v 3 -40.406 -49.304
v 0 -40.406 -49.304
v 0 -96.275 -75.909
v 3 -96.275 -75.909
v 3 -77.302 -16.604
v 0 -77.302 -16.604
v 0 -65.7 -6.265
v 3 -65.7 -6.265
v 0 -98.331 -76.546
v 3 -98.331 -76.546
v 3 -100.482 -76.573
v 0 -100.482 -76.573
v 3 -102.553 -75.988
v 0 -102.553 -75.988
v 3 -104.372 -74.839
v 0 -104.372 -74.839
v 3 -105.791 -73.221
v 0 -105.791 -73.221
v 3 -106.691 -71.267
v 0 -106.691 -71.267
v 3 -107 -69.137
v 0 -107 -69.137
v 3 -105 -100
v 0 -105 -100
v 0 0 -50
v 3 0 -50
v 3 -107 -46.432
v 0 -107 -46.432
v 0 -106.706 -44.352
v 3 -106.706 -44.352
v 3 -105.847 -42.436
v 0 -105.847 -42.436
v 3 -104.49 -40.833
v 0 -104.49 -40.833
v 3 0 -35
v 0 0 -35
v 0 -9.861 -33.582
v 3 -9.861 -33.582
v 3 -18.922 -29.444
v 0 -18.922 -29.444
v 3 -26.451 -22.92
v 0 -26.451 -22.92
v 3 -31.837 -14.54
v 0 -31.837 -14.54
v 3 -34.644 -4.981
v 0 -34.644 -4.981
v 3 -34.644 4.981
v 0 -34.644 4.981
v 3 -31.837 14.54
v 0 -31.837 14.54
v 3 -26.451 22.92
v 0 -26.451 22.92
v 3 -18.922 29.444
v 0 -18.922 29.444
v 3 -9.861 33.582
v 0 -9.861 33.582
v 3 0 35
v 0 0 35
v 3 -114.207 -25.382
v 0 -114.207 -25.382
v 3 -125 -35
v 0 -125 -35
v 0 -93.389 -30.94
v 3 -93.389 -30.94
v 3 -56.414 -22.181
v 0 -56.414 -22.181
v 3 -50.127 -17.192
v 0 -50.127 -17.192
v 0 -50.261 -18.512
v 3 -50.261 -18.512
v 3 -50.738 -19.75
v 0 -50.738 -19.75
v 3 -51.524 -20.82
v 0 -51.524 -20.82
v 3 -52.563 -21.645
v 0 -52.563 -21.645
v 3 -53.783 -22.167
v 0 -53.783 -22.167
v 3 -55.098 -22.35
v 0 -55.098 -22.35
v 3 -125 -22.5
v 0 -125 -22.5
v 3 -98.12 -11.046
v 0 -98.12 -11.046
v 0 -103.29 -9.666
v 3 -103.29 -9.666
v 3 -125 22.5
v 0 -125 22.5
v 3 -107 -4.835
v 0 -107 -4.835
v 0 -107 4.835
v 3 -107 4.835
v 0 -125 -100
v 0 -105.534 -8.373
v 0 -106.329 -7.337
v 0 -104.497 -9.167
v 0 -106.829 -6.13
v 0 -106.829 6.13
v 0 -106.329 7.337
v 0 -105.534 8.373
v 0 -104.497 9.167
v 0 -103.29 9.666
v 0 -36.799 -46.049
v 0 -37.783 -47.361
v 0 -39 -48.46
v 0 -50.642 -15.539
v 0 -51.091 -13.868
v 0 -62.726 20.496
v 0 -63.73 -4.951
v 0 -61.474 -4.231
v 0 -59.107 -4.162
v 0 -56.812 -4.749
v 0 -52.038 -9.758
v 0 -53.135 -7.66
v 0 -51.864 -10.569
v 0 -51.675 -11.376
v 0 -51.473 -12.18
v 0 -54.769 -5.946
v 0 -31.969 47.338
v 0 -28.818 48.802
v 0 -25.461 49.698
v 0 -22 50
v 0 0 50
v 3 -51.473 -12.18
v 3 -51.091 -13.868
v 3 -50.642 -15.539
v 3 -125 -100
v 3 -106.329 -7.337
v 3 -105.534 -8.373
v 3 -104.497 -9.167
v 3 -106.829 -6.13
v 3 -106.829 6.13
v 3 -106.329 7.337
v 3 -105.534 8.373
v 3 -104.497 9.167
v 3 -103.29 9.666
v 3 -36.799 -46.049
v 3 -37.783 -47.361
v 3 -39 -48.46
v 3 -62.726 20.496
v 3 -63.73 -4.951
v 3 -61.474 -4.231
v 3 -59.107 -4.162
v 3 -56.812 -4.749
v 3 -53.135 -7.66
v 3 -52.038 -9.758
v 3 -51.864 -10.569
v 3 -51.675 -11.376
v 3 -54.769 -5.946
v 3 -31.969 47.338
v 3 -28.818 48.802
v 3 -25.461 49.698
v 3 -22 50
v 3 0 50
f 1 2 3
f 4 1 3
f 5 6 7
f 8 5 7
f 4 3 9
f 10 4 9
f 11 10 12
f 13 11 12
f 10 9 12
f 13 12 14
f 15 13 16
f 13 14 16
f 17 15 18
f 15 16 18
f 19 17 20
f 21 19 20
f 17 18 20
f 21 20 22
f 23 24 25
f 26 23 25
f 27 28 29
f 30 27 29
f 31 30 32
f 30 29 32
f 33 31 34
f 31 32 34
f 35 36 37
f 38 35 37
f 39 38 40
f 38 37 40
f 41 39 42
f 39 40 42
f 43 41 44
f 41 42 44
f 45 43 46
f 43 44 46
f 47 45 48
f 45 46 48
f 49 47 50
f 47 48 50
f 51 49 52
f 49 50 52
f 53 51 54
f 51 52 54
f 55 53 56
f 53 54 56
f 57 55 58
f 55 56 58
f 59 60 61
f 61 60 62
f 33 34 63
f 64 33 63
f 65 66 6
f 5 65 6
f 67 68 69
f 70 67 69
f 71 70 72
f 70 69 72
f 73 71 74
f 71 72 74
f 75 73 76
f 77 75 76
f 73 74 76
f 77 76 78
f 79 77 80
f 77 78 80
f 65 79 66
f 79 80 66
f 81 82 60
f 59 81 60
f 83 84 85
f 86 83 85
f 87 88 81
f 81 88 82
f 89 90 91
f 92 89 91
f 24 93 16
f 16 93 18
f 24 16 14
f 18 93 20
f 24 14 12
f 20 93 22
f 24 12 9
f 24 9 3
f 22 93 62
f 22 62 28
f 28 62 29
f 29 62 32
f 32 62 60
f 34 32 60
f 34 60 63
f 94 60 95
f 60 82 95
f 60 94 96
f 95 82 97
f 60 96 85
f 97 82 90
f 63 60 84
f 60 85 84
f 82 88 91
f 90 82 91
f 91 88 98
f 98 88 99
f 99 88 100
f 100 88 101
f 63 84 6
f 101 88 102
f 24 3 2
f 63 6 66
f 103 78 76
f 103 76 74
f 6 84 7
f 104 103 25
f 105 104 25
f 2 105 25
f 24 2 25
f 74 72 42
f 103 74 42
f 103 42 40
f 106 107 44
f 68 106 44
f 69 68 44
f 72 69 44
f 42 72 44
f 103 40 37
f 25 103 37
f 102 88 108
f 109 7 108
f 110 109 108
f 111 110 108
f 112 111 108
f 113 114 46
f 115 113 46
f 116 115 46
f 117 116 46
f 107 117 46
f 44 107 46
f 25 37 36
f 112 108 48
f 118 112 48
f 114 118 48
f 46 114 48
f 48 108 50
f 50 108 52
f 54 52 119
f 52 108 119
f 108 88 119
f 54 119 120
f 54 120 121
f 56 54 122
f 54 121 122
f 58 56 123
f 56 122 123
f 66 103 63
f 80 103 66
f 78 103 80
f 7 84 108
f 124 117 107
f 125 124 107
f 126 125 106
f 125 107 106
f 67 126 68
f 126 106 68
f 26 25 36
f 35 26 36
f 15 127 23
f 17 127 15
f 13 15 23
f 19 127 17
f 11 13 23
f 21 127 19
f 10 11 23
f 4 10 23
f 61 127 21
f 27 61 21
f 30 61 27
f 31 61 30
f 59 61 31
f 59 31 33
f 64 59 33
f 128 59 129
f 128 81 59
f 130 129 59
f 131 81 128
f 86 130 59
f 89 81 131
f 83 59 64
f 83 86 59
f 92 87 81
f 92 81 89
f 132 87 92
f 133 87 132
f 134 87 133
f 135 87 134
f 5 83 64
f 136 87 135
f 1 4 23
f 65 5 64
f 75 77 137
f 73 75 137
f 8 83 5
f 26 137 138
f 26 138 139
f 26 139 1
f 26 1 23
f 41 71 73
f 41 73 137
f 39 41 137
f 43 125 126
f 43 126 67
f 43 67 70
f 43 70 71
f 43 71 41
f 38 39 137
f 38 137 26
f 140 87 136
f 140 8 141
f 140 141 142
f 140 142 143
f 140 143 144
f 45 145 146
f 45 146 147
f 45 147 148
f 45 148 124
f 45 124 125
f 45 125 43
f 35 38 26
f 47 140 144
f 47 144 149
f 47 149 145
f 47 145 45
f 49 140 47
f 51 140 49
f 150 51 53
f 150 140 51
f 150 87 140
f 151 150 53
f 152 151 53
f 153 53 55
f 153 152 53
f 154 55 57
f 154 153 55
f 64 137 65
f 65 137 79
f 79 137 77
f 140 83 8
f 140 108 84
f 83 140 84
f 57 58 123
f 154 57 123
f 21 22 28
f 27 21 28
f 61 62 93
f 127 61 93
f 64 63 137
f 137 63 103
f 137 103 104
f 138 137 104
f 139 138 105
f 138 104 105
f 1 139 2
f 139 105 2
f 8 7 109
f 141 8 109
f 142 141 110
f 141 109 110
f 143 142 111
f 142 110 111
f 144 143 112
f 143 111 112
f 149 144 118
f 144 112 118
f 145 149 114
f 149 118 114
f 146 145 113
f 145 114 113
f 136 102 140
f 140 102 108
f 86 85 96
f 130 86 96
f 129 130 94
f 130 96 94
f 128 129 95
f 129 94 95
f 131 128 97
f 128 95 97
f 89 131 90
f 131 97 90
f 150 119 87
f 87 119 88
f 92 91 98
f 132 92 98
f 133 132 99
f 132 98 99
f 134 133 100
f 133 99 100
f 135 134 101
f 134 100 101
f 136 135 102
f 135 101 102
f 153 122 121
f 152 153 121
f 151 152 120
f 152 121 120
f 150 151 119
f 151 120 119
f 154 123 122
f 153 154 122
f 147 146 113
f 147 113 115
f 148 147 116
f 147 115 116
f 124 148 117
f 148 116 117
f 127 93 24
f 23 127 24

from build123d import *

# Parameters (mm, degrees)
F1_DEPTH = 3
F3_DEPTH = 3


with BuildPart() as f1:
    # F0 (on Right) → F1 (new body)
    with BuildSketch(Plane.YZ):
        with BuildLine():
            ThreePointArc((0, -35), (-35, 0), (0, 35))
            Line((0, 35), (0, 50))
            Line((0, 50), (-22, 50))
            ThreePointArc((-22, 50), (-29.119444, 48.689931), (-35.306192, 44.931351))
            Line((-35.306192, 44.931351), (-125, -35))
            Line((-125, -35), (-125, -100))
            Line((-125, -100), (-105, -100))
            Line((-105, -100), (0, -50))
            Line((0, -50), (0, -35))
        make_face()
        with BuildLine():
            ThreePointArc((-96.275498, -75.908841), (-103.504138, -75.479065), (-107, -69.137387))
            Line((-107, -69.137387), (-107, -46.431792))
            ThreePointArc((-107, -46.431792), (-106.343744, -43.363703), (-104.489822, -40.832535))
            Line((-104.489822, -40.832535), (-65.699873, -6.264563))
            ThreePointArc((-65.699873, -6.264563), (-57.267065, -4.57705), (-51.677673, -11.113001))
            ThreePointArc((-51.677673, -11.113001), (-46.996343, -24.335108), (-38.322833, -35.358229))
            ThreePointArc((-38.322833, -35.358229), (-36.281412, -38.203278), (-35.560135, -41.629861))
            ThreePointArc((-35.560135, -41.629861), (-36.8729, -46.167883), (-40.405699, -49.304175))
            Line((-40.405699, -49.304175), (-96.275498, -75.908841))
        make_face(mode=Mode.SUBTRACT)
    extrude(amount=F1_DEPTH)

    # F2 (on Right) → F3 (join)
    with BuildSketch(Plane.YZ):
        with BuildLine():
            ThreePointArc((0, -35), (-35, 0), (0, 35))
            Line((0, 35), (0, 50))
            Line((0, 50), (-18.720067, 50))
            ThreePointArc((-18.720067, 50), (-21.972131, 49.787579), (-25.168931, 49.153926))
            Line((-25.168931, 49.153926), (-125, 22.5))
            Line((-125, 22.5), (-125, -22.5))
            Line((-125, -22.5), (-25.168931, -49.153926))
            ThreePointArc((-25.168931, -49.153926), (-21.972131, -49.787579), (-18.720067, -50))
            Line((-18.720067, -50), (0, -50))
            Line((0, -50), (0, -35))
        make_face()
        with BuildLine():
            Line((-103.289773, 9.665908), (-56.184511, 22.242556))
            ThreePointArc((-56.184511, 22.242556), (-51.209908, 20.791419), (-50.193177, 15.710206))
            ThreePointArc((-50.193177, 15.710206), (-52.998976, 0.017361), (-50.400586, -15.711156))
            ThreePointArc((-50.400586, -15.711156), (-51.461758, -20.754404), (-56.413973, -22.181292))
            Line((-56.413973, -22.181292), (-103.289773, -9.665908))
            ThreePointArc((-103.289773, -9.665908), (-105.965404, -7.880705), (-107, -4.835123))
            Line((-107, -4.835123), (-107, 4.835123))
            ThreePointArc((-107, 4.835123), (-105.965404, 7.880705), (-103.289773, 9.665908))
        make_face(mode=Mode.SUBTRACT)
    extrude(amount=F3_DEPTH)


solid = f1.part
